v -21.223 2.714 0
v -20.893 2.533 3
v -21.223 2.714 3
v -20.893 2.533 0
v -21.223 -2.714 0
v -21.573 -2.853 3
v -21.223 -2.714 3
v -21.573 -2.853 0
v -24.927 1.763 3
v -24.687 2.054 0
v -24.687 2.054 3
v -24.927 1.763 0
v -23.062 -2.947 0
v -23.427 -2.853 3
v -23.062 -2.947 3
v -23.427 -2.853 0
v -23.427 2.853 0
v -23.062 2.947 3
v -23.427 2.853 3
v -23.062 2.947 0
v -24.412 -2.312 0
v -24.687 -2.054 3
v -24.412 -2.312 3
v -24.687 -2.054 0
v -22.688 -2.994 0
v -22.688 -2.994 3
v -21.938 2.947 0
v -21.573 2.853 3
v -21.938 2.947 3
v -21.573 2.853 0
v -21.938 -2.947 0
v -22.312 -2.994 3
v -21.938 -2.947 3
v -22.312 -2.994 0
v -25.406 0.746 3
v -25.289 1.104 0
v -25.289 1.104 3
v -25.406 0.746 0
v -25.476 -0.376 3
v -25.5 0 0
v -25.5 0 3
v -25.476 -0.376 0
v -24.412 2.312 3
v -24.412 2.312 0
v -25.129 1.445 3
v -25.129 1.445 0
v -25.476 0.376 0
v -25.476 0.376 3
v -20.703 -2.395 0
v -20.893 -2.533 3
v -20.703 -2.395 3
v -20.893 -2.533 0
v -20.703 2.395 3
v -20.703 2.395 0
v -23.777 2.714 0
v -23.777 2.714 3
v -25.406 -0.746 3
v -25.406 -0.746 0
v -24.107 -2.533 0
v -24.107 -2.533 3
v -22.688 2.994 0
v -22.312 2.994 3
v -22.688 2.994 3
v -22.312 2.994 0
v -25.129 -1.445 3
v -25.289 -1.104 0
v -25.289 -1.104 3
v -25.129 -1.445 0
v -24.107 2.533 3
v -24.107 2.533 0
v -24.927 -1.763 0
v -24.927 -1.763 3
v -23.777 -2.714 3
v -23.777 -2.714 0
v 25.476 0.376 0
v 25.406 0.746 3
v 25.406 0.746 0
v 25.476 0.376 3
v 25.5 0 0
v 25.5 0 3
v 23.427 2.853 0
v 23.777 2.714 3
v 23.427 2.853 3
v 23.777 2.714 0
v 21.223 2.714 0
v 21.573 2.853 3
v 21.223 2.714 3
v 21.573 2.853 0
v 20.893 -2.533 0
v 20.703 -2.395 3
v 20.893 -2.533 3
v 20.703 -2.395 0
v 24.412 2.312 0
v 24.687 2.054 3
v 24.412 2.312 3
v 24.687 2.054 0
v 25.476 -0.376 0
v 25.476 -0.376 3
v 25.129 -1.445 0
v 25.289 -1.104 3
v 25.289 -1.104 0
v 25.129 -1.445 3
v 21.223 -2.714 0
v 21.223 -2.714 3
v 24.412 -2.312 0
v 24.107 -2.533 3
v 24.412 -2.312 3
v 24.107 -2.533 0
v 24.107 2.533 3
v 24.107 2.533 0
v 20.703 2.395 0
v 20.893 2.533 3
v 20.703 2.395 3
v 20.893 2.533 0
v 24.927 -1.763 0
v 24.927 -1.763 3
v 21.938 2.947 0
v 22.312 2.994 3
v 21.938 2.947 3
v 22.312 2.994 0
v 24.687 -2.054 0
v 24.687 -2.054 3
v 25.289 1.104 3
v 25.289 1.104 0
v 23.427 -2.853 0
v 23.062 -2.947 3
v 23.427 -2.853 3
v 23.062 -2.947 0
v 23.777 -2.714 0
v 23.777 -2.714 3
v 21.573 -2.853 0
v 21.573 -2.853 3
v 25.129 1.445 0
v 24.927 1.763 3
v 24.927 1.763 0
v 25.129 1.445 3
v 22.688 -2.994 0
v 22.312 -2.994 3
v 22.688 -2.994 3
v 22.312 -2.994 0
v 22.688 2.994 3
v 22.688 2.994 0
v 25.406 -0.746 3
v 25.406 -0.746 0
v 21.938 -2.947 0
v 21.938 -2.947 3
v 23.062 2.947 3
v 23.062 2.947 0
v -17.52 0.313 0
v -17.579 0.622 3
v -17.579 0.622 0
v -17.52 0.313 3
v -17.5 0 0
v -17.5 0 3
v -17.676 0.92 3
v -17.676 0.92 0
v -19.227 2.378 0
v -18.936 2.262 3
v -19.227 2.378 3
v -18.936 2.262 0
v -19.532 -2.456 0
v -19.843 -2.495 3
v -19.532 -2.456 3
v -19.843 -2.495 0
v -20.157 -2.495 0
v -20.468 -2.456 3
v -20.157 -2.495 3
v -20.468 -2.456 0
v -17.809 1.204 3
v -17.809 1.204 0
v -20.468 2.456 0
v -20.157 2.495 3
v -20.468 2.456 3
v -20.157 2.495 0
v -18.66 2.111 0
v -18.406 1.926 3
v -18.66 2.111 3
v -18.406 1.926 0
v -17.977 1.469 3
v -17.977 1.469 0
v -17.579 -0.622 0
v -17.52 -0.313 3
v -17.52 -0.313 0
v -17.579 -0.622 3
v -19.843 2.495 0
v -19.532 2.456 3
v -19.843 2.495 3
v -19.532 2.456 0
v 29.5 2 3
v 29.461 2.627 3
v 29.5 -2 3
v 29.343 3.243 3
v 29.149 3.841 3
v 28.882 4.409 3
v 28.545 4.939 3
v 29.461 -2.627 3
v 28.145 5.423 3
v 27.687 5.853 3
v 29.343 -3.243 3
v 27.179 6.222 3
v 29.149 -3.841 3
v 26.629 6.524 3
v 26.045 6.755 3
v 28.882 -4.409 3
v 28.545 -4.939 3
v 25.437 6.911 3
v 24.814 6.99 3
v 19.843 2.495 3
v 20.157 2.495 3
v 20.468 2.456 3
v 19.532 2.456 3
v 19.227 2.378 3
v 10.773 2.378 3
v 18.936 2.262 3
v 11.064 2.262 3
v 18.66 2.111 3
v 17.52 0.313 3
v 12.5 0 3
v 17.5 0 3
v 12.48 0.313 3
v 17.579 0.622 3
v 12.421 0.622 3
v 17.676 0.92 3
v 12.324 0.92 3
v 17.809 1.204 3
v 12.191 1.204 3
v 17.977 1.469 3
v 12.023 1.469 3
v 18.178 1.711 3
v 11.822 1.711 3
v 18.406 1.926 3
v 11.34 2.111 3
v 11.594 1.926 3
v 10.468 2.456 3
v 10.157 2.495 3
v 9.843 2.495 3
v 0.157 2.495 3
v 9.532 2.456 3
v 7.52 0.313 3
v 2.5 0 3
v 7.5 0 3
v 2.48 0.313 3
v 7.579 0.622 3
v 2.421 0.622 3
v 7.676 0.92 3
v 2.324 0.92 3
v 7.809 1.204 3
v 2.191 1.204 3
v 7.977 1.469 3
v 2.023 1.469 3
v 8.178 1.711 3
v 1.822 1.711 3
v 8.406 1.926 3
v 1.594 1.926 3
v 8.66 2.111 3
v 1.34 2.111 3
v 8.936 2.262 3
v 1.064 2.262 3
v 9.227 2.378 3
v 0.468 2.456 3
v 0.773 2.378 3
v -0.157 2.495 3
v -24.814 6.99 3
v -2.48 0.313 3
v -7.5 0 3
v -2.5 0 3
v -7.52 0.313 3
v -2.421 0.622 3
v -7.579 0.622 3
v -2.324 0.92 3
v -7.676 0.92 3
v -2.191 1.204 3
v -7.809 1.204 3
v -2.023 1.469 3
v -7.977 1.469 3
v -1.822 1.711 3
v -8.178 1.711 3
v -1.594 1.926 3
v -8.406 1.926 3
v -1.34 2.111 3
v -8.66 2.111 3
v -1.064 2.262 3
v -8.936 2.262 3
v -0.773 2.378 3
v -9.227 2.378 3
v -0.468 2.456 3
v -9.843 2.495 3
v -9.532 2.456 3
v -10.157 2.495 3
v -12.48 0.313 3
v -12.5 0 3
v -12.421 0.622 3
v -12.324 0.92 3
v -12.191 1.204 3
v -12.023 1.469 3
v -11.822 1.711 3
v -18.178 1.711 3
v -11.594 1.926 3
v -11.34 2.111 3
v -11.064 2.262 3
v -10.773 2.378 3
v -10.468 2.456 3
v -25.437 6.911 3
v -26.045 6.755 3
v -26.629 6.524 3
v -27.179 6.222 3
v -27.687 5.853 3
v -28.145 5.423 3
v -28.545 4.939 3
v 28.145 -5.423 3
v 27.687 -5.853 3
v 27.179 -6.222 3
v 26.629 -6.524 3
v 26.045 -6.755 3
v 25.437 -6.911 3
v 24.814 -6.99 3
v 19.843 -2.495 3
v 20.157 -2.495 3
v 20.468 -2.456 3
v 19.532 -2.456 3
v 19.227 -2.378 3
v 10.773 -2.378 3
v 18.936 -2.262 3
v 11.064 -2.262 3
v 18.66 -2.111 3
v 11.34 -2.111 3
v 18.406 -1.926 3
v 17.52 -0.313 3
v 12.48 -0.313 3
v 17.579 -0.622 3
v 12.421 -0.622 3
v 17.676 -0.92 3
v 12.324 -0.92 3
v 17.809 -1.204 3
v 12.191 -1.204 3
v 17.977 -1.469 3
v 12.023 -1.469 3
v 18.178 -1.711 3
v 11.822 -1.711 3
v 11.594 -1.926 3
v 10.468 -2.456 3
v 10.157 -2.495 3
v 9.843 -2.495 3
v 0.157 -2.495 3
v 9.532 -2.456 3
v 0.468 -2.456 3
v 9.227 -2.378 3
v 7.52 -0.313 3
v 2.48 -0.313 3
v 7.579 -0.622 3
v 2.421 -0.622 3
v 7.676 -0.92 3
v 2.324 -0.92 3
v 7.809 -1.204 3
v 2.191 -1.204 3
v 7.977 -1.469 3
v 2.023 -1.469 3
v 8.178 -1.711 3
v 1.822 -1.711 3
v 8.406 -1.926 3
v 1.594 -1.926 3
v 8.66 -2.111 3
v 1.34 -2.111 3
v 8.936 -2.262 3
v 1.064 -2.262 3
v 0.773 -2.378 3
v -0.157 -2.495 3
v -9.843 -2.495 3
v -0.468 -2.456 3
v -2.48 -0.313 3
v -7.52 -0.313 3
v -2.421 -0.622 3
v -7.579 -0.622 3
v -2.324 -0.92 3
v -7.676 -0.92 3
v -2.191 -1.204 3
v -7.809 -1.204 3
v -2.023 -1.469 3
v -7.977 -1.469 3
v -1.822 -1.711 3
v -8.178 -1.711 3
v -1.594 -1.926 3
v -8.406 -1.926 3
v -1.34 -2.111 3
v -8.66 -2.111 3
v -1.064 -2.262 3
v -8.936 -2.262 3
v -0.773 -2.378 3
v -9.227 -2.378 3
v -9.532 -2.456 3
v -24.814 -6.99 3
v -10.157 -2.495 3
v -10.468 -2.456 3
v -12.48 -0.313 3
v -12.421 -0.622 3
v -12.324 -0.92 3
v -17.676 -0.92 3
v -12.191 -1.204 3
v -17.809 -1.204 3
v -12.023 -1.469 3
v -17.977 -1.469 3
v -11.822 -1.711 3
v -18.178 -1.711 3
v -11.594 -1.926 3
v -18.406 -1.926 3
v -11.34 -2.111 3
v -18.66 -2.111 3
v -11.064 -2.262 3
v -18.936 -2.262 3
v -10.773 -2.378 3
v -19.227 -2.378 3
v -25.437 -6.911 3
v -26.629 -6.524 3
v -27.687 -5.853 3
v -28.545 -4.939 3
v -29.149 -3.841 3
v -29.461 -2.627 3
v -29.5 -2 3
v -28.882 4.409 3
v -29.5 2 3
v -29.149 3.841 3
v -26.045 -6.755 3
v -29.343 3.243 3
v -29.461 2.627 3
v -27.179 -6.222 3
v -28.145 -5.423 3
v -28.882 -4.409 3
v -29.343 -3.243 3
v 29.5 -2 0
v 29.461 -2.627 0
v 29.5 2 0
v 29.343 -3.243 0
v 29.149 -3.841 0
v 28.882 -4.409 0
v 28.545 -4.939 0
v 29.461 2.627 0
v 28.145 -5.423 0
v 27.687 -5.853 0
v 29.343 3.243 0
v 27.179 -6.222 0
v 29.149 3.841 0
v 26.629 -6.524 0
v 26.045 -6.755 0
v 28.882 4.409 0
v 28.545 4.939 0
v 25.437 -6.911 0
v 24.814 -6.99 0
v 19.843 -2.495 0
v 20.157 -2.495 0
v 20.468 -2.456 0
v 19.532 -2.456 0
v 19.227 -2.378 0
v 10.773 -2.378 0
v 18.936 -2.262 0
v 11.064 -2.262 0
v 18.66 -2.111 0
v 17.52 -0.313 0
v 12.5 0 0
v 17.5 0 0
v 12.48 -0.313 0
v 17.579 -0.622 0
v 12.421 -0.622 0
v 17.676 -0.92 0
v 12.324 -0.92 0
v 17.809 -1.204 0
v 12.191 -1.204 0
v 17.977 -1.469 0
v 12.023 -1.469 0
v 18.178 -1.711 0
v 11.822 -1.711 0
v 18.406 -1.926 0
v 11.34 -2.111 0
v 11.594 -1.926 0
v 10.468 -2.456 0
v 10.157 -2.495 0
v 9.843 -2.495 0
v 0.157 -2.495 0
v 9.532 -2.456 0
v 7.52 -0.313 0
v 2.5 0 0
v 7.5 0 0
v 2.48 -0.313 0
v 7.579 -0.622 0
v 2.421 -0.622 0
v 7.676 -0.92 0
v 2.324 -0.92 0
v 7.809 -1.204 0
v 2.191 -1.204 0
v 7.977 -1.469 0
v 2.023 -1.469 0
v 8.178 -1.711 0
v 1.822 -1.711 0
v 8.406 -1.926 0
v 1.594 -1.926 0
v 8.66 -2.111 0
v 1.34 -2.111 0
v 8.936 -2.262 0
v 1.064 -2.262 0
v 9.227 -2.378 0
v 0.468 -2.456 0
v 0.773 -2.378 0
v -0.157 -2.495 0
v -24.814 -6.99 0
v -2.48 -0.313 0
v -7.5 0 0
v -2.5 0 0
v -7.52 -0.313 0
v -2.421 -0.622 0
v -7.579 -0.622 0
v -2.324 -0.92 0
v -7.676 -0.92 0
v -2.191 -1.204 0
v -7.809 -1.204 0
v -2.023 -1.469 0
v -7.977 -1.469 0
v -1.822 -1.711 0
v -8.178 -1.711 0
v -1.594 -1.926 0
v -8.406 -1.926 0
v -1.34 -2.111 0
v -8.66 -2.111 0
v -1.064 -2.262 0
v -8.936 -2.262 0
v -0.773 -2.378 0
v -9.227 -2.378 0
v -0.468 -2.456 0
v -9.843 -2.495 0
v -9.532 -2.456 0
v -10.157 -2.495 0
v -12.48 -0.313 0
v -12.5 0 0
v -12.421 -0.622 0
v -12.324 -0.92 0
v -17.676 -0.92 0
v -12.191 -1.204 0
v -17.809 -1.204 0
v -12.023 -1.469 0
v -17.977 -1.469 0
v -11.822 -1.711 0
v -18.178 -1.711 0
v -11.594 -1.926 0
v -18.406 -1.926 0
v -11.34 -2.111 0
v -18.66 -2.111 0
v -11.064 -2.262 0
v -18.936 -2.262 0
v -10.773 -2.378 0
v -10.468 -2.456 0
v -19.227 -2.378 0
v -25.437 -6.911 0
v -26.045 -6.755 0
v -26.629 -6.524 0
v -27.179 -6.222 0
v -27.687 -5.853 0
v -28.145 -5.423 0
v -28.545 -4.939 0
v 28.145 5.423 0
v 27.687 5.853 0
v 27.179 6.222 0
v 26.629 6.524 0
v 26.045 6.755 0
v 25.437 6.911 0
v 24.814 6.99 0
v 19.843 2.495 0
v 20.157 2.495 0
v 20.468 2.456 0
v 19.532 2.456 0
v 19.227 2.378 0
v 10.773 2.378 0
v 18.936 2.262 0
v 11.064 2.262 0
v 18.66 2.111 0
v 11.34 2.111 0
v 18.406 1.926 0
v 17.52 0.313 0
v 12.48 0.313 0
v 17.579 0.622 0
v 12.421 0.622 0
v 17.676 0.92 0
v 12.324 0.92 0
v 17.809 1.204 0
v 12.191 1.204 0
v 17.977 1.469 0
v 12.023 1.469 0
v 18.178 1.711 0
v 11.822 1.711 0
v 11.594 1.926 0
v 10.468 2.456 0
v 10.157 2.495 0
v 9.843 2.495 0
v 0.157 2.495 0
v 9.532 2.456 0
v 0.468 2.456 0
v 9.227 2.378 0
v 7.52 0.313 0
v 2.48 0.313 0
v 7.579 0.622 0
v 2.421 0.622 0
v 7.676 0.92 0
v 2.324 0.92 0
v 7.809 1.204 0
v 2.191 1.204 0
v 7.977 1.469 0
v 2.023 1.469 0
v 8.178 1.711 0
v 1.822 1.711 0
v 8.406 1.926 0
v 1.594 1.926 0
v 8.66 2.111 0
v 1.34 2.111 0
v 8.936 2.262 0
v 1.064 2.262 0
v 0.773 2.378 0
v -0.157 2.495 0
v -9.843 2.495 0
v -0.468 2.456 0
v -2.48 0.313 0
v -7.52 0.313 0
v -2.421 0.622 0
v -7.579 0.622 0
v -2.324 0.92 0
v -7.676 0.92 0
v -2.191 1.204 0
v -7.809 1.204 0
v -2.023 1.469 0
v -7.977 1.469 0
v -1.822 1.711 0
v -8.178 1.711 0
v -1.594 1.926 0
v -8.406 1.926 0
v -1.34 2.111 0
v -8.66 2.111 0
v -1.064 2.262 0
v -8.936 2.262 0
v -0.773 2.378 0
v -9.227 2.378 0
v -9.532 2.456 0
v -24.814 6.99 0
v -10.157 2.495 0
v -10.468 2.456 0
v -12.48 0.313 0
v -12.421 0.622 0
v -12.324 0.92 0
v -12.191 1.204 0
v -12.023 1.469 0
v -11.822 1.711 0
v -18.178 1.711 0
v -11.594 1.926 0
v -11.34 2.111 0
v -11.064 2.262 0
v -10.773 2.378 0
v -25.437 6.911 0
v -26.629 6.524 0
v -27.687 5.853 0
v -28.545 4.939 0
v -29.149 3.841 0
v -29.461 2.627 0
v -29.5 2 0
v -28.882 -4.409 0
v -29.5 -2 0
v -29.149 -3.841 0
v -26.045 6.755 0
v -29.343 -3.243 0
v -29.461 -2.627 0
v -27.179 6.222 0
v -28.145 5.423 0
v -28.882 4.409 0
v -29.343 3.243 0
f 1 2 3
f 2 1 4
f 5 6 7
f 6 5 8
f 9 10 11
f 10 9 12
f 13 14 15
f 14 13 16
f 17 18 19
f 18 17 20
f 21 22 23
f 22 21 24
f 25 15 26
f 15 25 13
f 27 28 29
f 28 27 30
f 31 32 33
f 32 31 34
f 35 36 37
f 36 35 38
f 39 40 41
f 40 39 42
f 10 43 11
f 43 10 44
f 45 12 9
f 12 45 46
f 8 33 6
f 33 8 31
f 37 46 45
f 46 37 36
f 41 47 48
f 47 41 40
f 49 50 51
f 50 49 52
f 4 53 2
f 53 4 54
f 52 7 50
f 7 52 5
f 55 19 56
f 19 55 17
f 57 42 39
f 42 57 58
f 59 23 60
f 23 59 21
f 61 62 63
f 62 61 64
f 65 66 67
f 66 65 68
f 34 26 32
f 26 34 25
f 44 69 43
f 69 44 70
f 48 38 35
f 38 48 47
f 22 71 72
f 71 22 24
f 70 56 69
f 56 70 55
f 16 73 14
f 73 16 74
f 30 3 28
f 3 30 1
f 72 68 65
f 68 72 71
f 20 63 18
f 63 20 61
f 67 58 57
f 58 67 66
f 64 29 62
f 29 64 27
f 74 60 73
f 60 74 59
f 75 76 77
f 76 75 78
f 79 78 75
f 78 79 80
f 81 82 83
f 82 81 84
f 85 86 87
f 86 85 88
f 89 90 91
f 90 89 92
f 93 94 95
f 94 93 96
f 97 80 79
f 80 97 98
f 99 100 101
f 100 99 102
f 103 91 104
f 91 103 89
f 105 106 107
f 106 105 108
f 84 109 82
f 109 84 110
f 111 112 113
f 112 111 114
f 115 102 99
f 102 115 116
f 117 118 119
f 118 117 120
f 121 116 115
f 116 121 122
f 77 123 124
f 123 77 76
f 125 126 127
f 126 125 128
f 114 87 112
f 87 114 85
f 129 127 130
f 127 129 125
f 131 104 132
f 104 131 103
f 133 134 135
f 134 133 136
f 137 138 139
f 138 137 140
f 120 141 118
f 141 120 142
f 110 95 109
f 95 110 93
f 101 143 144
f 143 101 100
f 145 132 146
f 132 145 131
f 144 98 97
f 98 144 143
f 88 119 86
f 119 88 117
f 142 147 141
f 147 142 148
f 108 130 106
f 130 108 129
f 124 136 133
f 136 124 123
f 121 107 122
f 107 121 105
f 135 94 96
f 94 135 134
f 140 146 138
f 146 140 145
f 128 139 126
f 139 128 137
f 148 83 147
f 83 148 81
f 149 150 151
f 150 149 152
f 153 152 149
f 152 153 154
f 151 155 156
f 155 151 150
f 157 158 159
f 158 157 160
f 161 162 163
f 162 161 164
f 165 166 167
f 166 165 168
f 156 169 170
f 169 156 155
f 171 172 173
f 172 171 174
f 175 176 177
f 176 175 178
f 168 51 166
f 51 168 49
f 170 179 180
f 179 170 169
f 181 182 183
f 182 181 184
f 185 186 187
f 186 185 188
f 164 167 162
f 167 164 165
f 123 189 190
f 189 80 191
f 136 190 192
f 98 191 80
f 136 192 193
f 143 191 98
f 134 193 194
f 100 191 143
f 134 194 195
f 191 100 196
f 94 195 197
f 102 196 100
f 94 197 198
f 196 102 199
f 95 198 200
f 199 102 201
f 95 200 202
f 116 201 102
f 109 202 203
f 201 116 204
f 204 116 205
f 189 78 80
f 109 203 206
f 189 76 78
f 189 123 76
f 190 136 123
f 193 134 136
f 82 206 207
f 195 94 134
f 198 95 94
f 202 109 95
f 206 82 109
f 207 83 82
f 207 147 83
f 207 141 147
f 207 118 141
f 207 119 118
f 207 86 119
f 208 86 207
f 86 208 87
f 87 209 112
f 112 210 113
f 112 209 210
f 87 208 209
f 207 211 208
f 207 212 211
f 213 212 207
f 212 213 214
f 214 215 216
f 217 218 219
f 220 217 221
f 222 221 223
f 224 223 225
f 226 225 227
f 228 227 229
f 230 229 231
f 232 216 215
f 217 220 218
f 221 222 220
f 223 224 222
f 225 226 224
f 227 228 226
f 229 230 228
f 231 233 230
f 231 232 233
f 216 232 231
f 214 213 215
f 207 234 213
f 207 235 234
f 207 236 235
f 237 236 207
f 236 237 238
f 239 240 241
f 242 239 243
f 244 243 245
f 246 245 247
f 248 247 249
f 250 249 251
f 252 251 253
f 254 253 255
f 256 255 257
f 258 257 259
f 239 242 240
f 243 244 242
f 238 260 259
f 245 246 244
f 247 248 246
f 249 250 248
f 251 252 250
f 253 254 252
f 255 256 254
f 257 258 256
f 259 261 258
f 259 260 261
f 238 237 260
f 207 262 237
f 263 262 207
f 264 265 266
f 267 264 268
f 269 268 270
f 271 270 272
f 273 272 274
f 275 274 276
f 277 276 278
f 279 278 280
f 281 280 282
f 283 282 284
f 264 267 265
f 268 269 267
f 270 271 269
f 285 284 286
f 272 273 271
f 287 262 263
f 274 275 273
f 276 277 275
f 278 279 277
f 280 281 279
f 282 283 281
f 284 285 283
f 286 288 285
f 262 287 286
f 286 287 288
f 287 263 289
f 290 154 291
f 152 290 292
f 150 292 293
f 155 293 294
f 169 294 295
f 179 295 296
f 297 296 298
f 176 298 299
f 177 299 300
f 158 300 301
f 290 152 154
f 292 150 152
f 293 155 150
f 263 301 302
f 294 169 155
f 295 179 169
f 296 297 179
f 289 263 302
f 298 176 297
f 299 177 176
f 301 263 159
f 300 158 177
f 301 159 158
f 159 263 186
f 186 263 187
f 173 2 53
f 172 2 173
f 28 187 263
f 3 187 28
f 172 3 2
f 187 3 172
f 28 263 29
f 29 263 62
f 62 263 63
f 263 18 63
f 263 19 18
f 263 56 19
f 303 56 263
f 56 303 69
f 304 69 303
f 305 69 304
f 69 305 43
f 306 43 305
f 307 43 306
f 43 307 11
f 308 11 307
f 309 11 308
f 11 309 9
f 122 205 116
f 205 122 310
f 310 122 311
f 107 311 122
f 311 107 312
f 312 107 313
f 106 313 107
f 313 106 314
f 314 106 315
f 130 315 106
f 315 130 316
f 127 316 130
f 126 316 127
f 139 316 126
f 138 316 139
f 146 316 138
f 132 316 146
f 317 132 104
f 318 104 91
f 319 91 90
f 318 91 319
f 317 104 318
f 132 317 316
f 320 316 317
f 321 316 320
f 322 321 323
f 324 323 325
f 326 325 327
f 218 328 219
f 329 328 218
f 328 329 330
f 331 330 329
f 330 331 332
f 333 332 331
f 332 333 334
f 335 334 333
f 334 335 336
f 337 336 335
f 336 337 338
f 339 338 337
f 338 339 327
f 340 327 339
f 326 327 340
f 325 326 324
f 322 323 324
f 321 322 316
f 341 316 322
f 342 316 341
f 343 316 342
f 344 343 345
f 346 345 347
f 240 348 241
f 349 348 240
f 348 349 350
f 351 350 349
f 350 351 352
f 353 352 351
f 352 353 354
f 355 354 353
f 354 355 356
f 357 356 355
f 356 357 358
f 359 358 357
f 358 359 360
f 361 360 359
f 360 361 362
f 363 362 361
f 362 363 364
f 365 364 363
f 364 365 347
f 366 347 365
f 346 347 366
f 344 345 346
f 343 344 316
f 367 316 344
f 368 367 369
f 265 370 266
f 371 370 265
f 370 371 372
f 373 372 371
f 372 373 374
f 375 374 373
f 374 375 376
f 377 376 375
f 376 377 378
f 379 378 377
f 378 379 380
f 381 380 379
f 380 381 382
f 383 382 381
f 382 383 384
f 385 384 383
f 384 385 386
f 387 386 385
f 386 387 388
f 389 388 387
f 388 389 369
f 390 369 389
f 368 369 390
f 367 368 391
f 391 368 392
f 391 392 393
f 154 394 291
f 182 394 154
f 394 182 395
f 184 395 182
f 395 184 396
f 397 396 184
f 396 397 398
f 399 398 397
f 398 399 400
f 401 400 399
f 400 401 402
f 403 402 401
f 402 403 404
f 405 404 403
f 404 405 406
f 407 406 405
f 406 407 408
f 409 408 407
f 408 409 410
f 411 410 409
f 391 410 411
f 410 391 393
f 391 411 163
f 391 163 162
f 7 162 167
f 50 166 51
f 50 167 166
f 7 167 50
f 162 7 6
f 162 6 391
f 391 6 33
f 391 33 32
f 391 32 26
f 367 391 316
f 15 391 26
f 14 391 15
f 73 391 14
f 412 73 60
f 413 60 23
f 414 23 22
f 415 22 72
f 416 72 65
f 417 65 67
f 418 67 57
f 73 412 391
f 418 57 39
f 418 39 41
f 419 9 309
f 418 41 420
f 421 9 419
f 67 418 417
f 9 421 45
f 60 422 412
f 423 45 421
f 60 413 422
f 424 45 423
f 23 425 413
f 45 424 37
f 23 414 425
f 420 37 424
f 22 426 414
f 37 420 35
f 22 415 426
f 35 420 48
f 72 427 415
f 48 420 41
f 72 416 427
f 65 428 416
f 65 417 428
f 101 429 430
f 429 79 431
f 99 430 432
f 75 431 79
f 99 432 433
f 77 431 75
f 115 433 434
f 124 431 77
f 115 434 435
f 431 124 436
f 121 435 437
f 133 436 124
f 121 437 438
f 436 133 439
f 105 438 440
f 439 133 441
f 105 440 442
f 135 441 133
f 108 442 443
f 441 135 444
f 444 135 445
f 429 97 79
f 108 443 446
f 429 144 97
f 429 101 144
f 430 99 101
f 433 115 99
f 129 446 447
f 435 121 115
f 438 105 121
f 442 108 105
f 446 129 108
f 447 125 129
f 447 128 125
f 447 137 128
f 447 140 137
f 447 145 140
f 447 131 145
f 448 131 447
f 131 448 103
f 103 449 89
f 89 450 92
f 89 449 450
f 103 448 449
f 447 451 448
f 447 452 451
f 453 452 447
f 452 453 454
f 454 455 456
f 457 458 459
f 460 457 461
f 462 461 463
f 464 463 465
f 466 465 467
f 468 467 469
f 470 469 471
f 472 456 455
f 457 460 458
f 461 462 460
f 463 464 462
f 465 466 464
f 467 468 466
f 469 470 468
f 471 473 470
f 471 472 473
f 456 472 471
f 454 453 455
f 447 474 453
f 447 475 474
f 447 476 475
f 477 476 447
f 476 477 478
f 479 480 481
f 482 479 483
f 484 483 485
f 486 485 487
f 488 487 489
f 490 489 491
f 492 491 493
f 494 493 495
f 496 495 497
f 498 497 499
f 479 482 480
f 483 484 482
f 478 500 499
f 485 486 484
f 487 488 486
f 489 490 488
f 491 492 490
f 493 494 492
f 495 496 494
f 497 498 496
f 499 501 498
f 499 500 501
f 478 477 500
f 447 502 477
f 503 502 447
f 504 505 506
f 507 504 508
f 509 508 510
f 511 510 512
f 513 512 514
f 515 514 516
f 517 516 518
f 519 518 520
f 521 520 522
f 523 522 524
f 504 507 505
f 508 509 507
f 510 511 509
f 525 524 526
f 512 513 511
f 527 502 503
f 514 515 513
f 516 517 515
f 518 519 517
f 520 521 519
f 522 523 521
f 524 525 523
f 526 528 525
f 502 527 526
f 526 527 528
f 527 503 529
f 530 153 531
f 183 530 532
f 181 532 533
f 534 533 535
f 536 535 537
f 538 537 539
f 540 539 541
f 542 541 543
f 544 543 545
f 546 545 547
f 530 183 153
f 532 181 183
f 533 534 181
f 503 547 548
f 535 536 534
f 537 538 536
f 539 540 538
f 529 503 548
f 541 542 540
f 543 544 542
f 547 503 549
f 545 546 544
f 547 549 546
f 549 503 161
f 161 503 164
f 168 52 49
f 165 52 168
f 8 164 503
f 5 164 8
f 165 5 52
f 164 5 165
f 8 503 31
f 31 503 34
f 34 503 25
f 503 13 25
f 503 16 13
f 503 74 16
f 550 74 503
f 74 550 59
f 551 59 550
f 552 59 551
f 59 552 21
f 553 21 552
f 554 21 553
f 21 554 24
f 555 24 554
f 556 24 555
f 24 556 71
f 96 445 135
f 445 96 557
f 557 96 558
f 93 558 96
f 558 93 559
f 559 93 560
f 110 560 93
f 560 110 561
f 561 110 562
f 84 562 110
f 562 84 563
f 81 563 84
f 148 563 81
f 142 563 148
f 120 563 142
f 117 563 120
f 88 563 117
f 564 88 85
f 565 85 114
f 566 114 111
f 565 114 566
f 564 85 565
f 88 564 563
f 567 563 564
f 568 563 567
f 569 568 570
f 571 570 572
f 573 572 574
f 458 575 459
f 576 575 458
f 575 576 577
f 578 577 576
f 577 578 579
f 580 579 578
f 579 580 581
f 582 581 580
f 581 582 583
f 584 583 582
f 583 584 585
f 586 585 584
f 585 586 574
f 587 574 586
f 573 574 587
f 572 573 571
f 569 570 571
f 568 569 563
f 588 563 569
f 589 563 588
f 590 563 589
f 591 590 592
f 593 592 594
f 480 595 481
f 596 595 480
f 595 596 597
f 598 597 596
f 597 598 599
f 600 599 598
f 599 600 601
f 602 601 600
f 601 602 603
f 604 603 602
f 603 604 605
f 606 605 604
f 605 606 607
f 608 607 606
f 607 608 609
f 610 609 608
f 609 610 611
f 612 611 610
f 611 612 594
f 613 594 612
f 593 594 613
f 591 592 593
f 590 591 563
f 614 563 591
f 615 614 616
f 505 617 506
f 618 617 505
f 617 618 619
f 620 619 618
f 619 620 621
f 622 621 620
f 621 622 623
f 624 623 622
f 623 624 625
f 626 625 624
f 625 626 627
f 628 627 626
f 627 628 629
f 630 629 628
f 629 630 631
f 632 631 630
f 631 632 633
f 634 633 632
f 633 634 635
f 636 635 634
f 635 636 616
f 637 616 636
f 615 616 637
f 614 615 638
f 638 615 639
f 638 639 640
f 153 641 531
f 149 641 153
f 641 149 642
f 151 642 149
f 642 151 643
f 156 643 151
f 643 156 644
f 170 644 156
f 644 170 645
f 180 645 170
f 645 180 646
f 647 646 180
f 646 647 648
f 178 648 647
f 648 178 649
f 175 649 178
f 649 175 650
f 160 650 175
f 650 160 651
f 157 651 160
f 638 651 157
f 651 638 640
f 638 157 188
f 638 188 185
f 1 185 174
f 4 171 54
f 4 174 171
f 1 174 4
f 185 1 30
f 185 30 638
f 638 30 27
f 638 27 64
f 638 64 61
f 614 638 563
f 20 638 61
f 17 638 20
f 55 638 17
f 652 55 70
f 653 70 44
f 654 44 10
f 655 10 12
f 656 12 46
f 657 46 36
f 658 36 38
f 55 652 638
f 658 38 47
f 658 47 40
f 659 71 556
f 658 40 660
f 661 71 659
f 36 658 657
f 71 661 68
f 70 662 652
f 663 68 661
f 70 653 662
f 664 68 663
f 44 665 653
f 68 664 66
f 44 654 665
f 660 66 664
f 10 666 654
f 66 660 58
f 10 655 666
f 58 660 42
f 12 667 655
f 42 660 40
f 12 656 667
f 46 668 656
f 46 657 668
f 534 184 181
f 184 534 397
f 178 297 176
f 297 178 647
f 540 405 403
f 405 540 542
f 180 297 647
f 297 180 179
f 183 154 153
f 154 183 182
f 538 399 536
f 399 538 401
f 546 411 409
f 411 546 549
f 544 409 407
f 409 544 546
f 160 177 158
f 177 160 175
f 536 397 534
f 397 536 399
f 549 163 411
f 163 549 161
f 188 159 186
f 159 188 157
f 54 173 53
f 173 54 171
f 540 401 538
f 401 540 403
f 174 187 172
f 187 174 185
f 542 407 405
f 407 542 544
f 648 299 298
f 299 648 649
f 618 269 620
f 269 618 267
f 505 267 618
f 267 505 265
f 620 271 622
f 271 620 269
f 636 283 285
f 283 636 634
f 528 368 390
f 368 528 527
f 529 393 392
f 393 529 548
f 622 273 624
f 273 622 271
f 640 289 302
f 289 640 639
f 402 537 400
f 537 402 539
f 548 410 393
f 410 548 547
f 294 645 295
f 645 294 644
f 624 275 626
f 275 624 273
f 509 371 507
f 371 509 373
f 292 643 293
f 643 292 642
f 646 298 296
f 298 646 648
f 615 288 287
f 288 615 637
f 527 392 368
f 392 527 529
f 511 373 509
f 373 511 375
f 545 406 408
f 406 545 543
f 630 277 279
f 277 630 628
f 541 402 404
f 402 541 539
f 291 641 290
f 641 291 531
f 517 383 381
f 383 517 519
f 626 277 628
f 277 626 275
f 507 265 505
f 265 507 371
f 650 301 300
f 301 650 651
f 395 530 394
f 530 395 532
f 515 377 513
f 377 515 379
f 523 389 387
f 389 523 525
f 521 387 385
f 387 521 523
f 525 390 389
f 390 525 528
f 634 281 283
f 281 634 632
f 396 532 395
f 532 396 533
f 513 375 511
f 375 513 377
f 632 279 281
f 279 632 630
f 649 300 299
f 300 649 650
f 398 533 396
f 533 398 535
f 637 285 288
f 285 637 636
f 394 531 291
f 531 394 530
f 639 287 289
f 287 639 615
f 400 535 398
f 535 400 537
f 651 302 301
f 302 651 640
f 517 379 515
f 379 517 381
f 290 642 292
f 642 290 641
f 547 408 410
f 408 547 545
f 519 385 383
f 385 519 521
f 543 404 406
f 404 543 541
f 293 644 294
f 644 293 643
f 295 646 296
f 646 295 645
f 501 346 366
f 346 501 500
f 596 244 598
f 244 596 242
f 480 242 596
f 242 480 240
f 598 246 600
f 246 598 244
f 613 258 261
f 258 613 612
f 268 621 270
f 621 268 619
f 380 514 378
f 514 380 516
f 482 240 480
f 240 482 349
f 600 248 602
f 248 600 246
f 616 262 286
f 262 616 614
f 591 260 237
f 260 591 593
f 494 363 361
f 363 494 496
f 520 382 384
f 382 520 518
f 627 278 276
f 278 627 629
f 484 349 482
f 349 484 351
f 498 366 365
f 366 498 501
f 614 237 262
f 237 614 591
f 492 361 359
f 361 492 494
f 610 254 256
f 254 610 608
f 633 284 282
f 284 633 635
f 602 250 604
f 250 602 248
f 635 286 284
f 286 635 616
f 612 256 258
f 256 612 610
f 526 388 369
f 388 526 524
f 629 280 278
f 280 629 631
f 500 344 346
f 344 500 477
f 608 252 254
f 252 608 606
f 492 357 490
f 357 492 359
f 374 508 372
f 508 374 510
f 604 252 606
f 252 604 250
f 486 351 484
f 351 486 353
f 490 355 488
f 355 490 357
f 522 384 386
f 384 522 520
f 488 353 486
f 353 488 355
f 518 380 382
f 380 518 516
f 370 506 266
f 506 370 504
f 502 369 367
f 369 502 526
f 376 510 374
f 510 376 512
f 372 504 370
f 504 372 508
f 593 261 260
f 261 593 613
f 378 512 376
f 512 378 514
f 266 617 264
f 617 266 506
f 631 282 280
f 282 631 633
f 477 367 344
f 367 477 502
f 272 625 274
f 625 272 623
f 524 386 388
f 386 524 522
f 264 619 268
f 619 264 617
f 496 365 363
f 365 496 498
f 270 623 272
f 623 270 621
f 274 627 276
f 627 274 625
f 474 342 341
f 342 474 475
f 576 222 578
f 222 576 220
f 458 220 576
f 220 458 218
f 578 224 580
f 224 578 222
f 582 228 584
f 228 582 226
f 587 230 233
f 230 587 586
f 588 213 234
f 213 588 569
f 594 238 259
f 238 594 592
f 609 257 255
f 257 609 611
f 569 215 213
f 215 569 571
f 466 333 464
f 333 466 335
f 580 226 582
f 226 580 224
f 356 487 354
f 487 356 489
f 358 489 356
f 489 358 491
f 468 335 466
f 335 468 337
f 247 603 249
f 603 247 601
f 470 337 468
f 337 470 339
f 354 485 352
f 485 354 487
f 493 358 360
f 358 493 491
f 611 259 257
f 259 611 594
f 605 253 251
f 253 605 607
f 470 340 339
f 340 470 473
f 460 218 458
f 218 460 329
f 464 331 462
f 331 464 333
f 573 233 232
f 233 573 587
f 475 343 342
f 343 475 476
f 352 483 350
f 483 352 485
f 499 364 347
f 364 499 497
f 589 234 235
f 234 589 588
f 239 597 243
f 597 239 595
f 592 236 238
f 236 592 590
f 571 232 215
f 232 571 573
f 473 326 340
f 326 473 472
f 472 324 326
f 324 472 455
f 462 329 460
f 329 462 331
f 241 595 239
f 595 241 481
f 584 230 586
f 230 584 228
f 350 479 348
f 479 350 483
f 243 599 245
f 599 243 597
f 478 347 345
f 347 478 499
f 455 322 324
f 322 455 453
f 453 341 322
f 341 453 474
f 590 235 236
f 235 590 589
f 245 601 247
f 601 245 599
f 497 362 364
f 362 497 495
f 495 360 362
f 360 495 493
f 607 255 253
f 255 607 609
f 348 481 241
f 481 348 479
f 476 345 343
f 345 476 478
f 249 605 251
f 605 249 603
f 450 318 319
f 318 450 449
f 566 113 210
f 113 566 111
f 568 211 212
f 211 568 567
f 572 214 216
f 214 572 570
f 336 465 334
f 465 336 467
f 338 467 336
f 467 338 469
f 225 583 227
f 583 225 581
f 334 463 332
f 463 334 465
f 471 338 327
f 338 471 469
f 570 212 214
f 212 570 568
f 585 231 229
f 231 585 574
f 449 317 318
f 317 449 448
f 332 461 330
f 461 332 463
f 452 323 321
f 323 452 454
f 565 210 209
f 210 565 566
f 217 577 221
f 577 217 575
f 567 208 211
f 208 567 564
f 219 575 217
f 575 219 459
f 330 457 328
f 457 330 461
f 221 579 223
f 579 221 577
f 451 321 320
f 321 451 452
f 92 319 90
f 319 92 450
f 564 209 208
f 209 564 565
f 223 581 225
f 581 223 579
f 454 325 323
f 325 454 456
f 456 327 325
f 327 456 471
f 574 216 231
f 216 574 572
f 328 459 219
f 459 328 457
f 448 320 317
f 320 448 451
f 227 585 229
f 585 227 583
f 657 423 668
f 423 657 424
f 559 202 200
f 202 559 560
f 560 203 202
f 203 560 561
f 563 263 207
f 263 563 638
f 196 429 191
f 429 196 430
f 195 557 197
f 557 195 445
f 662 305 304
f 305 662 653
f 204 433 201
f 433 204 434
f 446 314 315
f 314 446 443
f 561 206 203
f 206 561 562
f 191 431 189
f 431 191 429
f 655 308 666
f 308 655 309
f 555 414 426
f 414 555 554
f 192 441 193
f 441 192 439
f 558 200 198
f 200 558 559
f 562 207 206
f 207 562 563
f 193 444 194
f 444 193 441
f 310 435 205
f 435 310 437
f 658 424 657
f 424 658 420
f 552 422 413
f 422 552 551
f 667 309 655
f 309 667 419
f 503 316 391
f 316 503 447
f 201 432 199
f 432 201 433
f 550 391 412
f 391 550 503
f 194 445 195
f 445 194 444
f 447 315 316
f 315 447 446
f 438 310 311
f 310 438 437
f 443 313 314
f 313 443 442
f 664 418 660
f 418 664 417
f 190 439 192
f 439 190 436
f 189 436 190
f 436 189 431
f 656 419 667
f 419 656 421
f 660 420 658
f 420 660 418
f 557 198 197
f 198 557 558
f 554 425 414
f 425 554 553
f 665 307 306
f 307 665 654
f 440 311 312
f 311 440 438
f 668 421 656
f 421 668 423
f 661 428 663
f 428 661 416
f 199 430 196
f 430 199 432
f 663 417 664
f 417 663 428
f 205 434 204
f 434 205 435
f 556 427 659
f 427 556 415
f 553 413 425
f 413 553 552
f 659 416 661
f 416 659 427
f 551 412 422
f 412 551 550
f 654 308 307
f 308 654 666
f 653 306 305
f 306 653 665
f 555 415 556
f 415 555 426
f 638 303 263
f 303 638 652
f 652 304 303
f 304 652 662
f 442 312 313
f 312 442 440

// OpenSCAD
$fn = 50;


difference() {
	union() {
		hull() {
			translate(v = [-24.5000000000, 2.0000000000, 0]) {
				cylinder(h = 3, r = 5);
			}
			translate(v = [24.5000000000, 2.0000000000, 0]) {
				cylinder(h = 3, r = 5);
			}
			translate(v = [-24.5000000000, -2.0000000000, 0]) {
				cylinder(h = 3, r = 5);
			}
			translate(v = [24.5000000000, -2.0000000000, 0]) {
				cylinder(h = 3, r = 5);
			}
		}
	}
	union() {
		#translate(v = [-22.5000000000, 0.0000000000, -100.0000000000]) {
			cylinder(h = 200, r = 3.0000000000);
		}
		#translate(v = [-22.5000000000, 0.0000000000, -100.0000000000]) {
			cylinder(h = 200, r = 3.0000000000);
		}
		#translate(v = [22.5000000000, 0.0000000000, -100.0000000000]) {
			cylinder(h = 200, r = 3.0000000000);
		}
		#translate(v = [22.5000000000, 0.0000000000, -100.0000000000]) {
			cylinder(h = 200, r = 3.0000000000);
		}
		#translate(v = [-20.0000000000, 0, 0]) {
			cylinder(h = 3, r = 2.5000000000);
		}
		#translate(v = [-10.0000000000, 0, 0]) {
			cylinder(h = 3, r = 2.5000000000);
		}
		#cylinder(h = 3, r = 2.5000000000);
		#translate(v = [10.0000000000, 0, 0]) {
			cylinder(h = 3, r = 2.5000000000);
		}
		#translate(v = [20.0000000000, 0, 0]) {
			cylinder(h = 3, r = 2.5000000000);
		}
	}
}
